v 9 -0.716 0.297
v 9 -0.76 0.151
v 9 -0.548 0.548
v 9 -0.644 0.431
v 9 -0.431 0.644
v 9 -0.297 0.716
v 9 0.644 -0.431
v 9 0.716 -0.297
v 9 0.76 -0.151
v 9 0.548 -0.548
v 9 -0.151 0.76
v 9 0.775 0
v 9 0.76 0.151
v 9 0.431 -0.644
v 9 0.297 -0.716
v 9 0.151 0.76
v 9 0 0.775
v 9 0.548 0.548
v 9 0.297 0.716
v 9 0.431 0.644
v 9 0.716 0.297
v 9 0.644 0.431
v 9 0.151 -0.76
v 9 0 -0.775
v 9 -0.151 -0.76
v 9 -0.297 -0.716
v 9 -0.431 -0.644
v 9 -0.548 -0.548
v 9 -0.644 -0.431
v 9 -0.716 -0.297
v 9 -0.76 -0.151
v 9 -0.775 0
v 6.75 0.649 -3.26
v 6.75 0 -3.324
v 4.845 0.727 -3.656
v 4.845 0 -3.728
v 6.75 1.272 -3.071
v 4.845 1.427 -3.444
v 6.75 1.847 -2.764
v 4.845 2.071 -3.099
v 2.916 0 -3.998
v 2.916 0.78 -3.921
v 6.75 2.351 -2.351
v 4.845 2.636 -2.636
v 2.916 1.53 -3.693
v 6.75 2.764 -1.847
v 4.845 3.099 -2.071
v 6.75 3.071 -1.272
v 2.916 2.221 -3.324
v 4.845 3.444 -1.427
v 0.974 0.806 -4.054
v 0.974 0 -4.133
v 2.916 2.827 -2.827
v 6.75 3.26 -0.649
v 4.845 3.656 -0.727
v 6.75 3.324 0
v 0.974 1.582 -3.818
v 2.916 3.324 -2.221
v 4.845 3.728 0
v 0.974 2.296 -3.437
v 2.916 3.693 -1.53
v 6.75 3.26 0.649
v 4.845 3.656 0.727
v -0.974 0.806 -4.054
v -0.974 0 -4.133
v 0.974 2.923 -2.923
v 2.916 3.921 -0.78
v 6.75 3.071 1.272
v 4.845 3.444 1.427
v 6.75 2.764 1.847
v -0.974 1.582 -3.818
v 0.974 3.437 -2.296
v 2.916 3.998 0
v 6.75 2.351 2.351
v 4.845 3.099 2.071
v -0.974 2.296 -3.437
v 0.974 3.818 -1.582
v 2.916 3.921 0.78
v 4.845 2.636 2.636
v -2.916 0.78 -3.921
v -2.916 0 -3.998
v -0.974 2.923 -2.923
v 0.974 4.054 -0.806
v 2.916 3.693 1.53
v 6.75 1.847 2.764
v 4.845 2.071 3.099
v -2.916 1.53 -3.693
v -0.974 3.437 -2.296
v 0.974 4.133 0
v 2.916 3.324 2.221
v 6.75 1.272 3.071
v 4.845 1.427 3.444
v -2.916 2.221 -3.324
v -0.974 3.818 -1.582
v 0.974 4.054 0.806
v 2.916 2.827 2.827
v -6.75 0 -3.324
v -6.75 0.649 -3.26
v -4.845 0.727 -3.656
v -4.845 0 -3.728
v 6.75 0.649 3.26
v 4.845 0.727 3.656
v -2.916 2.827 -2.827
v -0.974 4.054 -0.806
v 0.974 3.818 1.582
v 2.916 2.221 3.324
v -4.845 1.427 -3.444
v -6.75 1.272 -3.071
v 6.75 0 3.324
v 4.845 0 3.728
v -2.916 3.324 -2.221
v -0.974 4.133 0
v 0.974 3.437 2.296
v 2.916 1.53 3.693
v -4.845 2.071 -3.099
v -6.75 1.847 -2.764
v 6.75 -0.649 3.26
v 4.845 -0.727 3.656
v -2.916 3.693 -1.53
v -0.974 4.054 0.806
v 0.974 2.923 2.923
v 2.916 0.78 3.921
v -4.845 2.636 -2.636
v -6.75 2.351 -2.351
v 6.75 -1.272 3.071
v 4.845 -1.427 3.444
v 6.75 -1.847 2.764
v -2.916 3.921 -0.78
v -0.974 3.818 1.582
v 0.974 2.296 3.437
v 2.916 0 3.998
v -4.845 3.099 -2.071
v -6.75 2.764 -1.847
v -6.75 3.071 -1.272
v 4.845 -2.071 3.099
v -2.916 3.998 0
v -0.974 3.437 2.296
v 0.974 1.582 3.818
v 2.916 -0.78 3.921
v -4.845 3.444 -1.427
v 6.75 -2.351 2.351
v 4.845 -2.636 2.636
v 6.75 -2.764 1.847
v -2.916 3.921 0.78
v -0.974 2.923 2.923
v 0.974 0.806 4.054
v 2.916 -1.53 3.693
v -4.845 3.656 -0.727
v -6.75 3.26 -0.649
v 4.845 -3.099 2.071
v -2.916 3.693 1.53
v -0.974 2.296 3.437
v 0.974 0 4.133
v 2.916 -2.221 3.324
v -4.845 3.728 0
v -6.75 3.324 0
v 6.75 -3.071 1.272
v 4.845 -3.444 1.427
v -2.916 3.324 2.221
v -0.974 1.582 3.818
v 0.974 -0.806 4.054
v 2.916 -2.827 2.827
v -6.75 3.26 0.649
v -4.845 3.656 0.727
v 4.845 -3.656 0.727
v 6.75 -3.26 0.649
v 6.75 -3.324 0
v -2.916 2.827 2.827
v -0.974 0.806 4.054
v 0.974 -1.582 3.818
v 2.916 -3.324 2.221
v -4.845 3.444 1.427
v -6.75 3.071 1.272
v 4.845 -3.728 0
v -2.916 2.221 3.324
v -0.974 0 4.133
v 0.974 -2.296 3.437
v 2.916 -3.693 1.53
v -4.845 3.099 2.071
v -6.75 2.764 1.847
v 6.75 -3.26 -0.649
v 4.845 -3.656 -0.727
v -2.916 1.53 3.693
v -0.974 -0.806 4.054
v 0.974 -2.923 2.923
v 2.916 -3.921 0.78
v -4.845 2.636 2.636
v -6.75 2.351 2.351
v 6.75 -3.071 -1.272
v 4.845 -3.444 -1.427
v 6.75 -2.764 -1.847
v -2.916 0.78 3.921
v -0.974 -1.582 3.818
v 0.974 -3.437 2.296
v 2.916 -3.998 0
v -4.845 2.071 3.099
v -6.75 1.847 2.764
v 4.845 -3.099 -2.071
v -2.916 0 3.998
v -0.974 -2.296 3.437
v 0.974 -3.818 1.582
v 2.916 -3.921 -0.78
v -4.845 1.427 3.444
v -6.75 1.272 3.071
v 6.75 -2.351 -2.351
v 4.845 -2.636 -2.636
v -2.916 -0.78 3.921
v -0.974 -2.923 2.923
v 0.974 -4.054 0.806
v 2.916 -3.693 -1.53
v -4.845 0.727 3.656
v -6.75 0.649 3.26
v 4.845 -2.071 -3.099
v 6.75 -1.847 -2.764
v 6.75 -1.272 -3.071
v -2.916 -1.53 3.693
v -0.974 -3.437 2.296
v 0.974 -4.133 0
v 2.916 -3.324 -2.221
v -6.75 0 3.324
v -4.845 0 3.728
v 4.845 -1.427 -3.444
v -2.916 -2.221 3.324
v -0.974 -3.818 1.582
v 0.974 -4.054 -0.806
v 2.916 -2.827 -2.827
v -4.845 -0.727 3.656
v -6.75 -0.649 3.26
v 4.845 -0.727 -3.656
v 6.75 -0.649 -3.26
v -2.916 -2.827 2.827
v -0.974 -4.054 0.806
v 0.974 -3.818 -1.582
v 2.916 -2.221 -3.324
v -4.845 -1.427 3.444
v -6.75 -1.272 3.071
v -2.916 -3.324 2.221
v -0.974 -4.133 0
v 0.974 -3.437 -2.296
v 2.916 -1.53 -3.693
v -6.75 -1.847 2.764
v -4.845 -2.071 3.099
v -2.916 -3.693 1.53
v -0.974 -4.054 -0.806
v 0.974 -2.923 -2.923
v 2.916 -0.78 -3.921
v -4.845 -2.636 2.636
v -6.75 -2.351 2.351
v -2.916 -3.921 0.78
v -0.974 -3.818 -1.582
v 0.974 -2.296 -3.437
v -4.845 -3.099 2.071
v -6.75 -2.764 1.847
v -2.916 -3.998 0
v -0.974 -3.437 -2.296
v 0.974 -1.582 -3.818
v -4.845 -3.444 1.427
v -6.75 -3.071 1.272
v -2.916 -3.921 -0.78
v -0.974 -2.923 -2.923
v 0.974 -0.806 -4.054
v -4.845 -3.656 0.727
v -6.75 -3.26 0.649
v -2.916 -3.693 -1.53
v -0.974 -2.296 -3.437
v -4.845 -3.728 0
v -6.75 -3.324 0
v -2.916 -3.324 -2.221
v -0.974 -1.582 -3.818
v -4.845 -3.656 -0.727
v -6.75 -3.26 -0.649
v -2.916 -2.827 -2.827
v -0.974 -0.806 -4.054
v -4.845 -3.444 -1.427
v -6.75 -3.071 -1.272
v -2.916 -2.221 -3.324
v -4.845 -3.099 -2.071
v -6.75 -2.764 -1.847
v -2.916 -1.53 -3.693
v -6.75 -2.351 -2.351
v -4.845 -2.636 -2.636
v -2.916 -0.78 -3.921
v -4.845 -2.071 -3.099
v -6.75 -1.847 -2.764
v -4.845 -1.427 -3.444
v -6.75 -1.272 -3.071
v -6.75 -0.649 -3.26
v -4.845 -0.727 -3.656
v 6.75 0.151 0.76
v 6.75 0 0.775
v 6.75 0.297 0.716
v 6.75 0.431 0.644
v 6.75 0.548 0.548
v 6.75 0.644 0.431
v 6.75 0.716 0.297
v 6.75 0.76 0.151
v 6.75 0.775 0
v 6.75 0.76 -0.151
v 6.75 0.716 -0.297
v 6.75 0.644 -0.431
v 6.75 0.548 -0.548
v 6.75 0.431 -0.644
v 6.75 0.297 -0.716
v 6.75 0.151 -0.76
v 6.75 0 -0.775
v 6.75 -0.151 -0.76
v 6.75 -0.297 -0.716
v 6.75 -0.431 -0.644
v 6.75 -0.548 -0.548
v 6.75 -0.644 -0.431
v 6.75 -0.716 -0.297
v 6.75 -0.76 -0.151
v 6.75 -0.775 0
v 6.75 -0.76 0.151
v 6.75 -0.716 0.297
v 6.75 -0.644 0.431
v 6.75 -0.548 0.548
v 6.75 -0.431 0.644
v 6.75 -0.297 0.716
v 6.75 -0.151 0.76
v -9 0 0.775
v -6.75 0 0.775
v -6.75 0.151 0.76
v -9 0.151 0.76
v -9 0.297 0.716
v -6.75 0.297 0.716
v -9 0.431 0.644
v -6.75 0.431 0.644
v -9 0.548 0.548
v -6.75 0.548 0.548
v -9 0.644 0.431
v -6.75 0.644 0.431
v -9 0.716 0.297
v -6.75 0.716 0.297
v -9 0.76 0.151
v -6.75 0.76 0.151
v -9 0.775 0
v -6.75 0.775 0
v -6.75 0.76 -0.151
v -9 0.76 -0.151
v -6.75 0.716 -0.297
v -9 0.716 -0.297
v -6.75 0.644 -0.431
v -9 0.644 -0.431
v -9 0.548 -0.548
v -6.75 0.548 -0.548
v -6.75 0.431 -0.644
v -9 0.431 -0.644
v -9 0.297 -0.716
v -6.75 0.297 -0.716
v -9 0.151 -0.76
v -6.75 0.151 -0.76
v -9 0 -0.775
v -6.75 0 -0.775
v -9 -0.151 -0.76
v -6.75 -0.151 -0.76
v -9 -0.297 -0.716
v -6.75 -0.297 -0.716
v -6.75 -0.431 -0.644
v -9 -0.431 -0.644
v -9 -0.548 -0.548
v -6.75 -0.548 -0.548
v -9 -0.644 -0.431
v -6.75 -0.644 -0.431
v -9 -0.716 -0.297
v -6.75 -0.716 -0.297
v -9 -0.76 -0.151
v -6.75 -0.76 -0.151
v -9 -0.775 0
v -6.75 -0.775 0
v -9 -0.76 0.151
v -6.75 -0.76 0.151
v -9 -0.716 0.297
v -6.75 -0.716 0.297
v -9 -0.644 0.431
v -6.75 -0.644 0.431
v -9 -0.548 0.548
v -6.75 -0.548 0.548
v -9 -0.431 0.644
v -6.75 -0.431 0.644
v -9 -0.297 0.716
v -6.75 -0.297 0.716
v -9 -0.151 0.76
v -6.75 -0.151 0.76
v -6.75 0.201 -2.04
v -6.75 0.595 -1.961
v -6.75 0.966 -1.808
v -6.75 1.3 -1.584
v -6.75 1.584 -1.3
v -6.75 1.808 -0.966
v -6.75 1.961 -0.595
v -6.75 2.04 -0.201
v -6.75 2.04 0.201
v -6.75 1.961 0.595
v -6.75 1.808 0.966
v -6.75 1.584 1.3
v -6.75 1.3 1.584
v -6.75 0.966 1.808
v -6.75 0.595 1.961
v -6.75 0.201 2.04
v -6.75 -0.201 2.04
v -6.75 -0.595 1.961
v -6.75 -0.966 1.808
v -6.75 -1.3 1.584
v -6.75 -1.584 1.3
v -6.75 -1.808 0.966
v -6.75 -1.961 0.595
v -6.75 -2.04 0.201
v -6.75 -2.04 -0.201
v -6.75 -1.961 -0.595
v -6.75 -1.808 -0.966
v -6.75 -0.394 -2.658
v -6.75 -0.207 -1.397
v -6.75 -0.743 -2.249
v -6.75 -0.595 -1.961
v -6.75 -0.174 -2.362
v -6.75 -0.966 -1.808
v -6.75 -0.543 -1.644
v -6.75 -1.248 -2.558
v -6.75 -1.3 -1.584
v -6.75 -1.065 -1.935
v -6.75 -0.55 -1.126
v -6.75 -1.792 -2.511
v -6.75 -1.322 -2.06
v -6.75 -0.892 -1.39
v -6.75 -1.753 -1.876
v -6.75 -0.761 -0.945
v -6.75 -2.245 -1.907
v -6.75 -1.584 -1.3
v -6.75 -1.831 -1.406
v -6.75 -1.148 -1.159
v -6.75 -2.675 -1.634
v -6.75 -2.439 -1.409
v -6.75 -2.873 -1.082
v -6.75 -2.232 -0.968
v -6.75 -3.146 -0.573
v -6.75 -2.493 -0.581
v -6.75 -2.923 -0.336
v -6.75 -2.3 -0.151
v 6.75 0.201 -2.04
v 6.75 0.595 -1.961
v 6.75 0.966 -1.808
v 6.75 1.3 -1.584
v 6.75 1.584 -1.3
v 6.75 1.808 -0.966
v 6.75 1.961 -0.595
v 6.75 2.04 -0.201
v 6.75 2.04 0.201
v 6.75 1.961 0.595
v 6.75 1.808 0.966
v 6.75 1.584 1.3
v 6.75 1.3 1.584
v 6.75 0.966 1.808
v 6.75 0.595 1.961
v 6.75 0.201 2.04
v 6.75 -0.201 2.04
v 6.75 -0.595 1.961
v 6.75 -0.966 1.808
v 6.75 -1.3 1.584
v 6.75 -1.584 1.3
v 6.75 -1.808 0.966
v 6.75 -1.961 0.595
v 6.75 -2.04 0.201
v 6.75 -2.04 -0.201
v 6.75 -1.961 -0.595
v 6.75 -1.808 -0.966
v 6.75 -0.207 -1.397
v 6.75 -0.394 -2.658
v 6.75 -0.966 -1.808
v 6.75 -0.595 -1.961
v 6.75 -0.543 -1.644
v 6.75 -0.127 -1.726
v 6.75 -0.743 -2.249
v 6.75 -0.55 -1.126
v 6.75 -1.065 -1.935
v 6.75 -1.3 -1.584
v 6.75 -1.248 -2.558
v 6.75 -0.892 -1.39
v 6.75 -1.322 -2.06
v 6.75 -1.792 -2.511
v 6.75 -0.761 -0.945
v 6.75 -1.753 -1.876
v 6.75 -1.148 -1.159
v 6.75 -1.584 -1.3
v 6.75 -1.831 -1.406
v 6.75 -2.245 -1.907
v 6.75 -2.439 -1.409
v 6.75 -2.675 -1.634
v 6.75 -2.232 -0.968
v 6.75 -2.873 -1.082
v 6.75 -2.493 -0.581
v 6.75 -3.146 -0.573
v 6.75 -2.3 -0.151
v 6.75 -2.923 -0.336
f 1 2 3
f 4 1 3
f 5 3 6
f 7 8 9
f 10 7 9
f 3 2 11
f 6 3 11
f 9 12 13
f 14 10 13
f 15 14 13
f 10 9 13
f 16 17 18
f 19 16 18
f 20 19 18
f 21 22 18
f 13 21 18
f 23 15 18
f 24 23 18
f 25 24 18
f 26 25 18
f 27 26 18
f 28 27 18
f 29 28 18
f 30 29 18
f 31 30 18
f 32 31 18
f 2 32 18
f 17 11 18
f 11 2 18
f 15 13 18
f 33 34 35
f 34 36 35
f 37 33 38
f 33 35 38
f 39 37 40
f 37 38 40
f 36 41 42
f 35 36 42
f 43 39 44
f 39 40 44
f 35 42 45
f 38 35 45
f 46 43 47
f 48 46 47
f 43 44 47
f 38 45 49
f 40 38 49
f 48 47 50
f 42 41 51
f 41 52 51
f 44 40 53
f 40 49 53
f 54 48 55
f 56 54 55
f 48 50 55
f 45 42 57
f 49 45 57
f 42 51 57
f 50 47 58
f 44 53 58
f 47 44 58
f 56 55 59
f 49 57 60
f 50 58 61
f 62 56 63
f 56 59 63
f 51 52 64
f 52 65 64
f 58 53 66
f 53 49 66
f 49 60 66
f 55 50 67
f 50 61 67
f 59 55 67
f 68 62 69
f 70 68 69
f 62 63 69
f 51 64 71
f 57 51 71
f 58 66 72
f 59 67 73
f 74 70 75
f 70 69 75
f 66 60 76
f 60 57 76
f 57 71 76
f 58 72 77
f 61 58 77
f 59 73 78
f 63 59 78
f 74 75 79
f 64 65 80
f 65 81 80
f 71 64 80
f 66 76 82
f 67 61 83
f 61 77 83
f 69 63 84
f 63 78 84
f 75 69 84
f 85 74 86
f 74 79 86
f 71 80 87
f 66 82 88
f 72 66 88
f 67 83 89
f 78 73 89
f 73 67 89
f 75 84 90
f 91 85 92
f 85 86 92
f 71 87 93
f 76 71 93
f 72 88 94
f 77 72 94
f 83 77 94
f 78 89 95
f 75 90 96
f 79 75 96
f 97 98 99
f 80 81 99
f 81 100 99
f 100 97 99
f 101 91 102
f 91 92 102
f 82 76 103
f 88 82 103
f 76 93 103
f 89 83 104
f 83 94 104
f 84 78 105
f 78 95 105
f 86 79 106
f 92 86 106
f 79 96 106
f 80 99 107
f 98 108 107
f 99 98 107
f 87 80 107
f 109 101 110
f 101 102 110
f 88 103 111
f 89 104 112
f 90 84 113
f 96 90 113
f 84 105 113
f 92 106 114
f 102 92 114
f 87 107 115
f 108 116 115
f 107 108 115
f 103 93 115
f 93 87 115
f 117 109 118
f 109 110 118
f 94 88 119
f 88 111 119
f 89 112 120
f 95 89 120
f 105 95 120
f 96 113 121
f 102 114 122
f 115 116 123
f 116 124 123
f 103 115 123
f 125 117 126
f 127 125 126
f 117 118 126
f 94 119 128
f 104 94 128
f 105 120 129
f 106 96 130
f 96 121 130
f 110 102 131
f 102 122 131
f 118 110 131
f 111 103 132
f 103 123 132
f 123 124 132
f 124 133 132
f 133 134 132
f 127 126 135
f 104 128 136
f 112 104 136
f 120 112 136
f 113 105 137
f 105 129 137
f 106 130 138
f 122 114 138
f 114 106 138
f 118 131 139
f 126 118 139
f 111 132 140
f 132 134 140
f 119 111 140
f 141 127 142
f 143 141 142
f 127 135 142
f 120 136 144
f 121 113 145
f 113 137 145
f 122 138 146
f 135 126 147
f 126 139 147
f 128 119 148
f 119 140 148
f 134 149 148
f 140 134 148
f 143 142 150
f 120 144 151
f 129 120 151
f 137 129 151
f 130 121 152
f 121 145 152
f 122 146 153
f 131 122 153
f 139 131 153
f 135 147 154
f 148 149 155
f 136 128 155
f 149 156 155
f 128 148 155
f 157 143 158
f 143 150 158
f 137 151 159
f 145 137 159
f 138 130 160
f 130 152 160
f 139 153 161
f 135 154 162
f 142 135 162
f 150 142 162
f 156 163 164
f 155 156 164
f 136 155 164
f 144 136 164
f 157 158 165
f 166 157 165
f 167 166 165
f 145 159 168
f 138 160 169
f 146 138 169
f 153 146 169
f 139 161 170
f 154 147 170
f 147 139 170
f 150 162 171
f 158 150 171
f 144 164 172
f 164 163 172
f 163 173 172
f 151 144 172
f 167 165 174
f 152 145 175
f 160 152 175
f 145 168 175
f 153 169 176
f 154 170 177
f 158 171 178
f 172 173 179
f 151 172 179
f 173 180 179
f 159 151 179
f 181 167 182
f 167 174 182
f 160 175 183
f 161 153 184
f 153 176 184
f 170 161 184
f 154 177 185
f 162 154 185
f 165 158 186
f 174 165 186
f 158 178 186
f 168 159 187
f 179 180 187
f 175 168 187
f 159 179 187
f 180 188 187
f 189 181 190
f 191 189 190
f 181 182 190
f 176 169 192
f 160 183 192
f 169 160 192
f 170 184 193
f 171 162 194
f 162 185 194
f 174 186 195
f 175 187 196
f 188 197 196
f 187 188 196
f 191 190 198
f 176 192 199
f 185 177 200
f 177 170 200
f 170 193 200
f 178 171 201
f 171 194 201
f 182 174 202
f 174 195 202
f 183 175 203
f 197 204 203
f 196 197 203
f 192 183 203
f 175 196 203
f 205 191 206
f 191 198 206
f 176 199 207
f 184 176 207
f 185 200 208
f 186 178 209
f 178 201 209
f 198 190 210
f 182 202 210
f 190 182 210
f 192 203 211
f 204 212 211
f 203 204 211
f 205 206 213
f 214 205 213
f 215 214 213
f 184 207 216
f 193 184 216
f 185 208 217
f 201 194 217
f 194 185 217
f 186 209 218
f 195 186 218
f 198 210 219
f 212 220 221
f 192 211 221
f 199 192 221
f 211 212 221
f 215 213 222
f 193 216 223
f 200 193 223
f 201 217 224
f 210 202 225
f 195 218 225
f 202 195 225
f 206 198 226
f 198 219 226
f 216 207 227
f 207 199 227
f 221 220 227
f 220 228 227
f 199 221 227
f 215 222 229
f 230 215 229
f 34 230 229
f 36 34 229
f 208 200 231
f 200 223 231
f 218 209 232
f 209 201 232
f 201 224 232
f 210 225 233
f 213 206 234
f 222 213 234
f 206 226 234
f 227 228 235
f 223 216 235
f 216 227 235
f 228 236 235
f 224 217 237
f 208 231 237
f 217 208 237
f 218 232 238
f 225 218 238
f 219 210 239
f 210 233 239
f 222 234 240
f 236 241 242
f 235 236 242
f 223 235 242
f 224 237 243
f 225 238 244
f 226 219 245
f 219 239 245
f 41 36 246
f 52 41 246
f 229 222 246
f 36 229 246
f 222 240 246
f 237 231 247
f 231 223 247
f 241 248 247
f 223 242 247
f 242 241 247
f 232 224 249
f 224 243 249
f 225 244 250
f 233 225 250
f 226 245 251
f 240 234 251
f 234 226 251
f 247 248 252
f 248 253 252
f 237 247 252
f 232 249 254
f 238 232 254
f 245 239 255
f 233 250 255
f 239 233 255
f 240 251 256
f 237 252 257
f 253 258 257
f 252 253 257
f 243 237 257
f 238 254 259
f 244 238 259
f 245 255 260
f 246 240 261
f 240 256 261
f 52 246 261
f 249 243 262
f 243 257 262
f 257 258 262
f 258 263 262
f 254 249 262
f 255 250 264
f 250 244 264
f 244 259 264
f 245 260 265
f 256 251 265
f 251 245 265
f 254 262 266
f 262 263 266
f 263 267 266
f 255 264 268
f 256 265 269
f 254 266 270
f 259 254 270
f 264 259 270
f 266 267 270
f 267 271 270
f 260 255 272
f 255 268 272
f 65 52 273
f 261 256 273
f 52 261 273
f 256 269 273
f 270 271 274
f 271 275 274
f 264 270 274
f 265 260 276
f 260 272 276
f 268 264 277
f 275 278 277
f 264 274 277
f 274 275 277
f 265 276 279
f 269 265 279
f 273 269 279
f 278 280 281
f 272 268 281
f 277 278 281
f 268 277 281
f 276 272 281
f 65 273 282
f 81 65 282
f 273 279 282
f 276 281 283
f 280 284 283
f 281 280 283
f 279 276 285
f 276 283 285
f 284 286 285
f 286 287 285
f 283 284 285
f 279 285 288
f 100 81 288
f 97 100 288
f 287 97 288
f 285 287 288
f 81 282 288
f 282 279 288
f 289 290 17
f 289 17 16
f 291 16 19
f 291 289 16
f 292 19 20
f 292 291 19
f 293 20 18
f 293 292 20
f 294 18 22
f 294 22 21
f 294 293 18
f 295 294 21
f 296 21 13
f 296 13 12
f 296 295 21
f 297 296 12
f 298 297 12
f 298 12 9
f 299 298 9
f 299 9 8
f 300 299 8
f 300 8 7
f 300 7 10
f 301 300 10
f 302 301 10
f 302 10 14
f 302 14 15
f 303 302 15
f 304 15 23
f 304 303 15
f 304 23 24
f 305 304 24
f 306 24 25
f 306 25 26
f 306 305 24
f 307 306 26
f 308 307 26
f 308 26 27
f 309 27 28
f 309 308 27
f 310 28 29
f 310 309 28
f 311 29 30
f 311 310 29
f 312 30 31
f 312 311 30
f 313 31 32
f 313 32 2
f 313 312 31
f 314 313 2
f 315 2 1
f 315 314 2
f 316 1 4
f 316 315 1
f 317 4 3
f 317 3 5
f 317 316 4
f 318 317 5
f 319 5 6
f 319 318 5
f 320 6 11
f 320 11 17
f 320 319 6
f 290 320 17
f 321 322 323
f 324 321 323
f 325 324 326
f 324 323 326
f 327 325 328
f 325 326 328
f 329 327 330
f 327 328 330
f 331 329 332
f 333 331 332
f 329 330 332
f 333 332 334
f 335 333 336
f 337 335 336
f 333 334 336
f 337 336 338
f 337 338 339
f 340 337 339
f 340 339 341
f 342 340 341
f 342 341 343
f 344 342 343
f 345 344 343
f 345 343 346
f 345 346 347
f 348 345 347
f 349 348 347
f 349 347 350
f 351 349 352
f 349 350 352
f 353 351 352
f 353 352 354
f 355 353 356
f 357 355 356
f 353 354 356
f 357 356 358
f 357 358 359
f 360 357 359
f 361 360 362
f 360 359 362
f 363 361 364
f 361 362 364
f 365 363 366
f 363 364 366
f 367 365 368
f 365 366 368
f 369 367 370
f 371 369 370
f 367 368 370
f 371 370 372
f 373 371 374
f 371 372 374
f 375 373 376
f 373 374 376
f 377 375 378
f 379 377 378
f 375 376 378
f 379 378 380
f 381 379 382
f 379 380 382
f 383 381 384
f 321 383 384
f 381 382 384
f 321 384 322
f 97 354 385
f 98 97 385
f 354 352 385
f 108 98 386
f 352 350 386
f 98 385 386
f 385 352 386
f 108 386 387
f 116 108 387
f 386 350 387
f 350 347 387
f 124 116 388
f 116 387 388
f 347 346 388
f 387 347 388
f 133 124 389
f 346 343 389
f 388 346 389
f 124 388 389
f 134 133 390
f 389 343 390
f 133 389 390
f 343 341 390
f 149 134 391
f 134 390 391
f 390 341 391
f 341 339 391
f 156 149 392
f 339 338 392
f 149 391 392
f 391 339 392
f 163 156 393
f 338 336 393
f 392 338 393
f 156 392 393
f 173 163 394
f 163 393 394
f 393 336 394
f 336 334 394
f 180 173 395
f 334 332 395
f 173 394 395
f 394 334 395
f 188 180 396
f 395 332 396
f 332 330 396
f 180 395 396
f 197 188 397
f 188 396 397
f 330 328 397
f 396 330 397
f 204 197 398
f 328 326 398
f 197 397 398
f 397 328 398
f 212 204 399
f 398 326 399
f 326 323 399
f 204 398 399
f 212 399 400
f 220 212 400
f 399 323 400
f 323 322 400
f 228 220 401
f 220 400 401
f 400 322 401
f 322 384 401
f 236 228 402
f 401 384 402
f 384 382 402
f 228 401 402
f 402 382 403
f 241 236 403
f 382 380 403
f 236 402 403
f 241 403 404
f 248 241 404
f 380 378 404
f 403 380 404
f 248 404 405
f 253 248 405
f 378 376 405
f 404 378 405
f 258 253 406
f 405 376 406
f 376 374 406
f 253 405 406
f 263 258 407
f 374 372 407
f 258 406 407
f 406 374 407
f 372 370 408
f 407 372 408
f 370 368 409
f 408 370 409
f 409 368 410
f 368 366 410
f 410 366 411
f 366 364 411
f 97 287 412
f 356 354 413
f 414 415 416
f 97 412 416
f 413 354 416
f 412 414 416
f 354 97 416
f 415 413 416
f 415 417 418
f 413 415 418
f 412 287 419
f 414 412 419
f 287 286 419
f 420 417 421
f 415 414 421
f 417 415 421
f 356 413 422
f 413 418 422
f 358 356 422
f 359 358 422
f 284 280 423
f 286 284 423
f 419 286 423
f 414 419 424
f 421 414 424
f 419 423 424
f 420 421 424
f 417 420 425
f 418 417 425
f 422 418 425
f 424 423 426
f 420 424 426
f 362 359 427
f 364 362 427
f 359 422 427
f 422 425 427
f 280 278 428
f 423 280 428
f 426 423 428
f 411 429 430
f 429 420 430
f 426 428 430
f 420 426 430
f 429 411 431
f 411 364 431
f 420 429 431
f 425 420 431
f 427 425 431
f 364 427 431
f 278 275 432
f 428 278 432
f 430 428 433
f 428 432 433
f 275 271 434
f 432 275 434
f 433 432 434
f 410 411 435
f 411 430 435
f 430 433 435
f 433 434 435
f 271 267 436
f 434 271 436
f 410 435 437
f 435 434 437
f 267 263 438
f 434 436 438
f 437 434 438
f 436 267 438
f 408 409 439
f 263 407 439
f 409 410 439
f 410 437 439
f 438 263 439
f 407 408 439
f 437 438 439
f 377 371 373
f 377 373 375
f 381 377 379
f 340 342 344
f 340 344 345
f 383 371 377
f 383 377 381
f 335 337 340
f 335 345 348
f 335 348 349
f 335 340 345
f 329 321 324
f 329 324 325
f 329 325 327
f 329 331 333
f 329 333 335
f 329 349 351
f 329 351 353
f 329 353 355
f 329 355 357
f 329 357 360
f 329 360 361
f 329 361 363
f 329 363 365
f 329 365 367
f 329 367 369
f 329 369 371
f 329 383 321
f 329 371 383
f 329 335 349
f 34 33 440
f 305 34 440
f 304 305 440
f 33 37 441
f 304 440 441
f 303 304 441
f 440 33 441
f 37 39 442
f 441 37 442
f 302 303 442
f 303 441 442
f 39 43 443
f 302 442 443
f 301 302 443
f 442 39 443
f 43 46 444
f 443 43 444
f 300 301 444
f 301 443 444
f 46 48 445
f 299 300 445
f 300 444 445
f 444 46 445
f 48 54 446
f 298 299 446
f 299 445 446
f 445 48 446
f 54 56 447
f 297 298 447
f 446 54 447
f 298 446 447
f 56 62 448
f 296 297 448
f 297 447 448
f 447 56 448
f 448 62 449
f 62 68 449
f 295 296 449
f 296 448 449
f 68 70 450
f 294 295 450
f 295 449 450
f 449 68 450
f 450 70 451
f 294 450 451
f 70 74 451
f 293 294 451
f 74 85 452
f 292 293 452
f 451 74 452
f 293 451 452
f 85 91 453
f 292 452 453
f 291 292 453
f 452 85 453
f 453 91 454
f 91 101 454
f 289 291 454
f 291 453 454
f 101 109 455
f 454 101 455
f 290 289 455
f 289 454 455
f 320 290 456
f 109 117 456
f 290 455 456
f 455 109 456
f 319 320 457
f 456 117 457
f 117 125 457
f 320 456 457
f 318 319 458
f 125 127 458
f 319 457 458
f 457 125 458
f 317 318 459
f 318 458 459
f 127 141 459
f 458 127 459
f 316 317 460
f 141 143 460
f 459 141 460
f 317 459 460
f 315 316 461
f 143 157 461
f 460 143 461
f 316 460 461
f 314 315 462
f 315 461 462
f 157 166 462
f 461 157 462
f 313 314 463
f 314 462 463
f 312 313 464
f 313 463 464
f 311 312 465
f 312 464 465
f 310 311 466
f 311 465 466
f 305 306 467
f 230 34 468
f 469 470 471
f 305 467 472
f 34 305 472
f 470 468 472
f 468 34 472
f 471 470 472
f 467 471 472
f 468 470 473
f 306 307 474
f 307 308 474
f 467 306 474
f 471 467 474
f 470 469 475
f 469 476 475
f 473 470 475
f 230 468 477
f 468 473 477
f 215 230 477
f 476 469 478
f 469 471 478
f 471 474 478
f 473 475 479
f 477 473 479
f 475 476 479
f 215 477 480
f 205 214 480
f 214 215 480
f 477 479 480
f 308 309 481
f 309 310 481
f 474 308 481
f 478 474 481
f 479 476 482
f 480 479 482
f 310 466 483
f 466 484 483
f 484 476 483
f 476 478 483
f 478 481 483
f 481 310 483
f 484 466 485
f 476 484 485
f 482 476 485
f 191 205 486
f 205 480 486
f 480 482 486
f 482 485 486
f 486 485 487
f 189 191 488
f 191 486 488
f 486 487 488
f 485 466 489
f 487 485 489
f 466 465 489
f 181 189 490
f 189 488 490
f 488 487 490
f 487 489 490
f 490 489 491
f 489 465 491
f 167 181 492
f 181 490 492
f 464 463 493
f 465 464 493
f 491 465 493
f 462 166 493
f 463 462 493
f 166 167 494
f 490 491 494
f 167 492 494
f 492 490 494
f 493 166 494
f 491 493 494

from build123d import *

# Parameters (mm, degrees)
SKETCH3_R           = 0.775
BOSS_EXTRUDE1_DEPTH = 2.25


with BuildPart() as part:
    # Sweep1: sweep along a path in Sketch1
    with BuildLine(Plane(origin=(0, 0, 0), x_dir=(0, 0, -1), z_dir=(1, 0, 0))) as sweep1_path:
        CenterArc((0, 0), 4.15, 0, 360)
    # Sketch2 → Sweep1 (sweep)
    with BuildSketch(Plane.XY):
        with BuildLine():
            Line((6.75, 0), (-6.75, 0))
            Line((-6.75, 0), (-6.75, 3.32420652))
            ThreePointArc((-6.75, 3.32420652), (0, 4.15), (6.75, 3.32420652))
            Line((6.75, 3.32420652), (6.75, 0))
        make_face()
    sweep(path=sweep1_path.line)

    # Sketch3 → Boss-Extrude1 (add)
    with BuildSketch(Plane.ZY.offset(6.75)):
        Circle(SKETCH3_R)
    boss_extrude1 = extrude(amount=BOSS_EXTRUDE1_DEPTH)

    # Mirror1: Boss-Extrude1 across plane
    add(boss_extrude1.mirror(Plane(origin=(0, 0, 0), x_dir=(0, 0, 1), z_dir=(1, 0, 0))))


solid = part.part
